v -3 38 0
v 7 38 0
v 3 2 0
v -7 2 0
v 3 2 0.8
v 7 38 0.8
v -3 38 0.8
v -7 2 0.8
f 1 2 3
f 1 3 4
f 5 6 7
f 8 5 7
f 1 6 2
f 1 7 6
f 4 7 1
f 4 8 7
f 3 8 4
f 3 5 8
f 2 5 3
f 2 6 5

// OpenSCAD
// these ought be printed clear, and used to lock in
// the labels on hard drive cages. the polygon is based
// off of enclosurewrapper.scad.

gap = 2;
vgap = 3;

linear_extrude(.8){
	polygon([
					 [10 - vgap, 40 - gap],
					 [0 + vgap, 0 + gap],
					 [-10 + vgap, 0 + gap],
					 [0 - vgap, 40 - gap]
					]);
}
